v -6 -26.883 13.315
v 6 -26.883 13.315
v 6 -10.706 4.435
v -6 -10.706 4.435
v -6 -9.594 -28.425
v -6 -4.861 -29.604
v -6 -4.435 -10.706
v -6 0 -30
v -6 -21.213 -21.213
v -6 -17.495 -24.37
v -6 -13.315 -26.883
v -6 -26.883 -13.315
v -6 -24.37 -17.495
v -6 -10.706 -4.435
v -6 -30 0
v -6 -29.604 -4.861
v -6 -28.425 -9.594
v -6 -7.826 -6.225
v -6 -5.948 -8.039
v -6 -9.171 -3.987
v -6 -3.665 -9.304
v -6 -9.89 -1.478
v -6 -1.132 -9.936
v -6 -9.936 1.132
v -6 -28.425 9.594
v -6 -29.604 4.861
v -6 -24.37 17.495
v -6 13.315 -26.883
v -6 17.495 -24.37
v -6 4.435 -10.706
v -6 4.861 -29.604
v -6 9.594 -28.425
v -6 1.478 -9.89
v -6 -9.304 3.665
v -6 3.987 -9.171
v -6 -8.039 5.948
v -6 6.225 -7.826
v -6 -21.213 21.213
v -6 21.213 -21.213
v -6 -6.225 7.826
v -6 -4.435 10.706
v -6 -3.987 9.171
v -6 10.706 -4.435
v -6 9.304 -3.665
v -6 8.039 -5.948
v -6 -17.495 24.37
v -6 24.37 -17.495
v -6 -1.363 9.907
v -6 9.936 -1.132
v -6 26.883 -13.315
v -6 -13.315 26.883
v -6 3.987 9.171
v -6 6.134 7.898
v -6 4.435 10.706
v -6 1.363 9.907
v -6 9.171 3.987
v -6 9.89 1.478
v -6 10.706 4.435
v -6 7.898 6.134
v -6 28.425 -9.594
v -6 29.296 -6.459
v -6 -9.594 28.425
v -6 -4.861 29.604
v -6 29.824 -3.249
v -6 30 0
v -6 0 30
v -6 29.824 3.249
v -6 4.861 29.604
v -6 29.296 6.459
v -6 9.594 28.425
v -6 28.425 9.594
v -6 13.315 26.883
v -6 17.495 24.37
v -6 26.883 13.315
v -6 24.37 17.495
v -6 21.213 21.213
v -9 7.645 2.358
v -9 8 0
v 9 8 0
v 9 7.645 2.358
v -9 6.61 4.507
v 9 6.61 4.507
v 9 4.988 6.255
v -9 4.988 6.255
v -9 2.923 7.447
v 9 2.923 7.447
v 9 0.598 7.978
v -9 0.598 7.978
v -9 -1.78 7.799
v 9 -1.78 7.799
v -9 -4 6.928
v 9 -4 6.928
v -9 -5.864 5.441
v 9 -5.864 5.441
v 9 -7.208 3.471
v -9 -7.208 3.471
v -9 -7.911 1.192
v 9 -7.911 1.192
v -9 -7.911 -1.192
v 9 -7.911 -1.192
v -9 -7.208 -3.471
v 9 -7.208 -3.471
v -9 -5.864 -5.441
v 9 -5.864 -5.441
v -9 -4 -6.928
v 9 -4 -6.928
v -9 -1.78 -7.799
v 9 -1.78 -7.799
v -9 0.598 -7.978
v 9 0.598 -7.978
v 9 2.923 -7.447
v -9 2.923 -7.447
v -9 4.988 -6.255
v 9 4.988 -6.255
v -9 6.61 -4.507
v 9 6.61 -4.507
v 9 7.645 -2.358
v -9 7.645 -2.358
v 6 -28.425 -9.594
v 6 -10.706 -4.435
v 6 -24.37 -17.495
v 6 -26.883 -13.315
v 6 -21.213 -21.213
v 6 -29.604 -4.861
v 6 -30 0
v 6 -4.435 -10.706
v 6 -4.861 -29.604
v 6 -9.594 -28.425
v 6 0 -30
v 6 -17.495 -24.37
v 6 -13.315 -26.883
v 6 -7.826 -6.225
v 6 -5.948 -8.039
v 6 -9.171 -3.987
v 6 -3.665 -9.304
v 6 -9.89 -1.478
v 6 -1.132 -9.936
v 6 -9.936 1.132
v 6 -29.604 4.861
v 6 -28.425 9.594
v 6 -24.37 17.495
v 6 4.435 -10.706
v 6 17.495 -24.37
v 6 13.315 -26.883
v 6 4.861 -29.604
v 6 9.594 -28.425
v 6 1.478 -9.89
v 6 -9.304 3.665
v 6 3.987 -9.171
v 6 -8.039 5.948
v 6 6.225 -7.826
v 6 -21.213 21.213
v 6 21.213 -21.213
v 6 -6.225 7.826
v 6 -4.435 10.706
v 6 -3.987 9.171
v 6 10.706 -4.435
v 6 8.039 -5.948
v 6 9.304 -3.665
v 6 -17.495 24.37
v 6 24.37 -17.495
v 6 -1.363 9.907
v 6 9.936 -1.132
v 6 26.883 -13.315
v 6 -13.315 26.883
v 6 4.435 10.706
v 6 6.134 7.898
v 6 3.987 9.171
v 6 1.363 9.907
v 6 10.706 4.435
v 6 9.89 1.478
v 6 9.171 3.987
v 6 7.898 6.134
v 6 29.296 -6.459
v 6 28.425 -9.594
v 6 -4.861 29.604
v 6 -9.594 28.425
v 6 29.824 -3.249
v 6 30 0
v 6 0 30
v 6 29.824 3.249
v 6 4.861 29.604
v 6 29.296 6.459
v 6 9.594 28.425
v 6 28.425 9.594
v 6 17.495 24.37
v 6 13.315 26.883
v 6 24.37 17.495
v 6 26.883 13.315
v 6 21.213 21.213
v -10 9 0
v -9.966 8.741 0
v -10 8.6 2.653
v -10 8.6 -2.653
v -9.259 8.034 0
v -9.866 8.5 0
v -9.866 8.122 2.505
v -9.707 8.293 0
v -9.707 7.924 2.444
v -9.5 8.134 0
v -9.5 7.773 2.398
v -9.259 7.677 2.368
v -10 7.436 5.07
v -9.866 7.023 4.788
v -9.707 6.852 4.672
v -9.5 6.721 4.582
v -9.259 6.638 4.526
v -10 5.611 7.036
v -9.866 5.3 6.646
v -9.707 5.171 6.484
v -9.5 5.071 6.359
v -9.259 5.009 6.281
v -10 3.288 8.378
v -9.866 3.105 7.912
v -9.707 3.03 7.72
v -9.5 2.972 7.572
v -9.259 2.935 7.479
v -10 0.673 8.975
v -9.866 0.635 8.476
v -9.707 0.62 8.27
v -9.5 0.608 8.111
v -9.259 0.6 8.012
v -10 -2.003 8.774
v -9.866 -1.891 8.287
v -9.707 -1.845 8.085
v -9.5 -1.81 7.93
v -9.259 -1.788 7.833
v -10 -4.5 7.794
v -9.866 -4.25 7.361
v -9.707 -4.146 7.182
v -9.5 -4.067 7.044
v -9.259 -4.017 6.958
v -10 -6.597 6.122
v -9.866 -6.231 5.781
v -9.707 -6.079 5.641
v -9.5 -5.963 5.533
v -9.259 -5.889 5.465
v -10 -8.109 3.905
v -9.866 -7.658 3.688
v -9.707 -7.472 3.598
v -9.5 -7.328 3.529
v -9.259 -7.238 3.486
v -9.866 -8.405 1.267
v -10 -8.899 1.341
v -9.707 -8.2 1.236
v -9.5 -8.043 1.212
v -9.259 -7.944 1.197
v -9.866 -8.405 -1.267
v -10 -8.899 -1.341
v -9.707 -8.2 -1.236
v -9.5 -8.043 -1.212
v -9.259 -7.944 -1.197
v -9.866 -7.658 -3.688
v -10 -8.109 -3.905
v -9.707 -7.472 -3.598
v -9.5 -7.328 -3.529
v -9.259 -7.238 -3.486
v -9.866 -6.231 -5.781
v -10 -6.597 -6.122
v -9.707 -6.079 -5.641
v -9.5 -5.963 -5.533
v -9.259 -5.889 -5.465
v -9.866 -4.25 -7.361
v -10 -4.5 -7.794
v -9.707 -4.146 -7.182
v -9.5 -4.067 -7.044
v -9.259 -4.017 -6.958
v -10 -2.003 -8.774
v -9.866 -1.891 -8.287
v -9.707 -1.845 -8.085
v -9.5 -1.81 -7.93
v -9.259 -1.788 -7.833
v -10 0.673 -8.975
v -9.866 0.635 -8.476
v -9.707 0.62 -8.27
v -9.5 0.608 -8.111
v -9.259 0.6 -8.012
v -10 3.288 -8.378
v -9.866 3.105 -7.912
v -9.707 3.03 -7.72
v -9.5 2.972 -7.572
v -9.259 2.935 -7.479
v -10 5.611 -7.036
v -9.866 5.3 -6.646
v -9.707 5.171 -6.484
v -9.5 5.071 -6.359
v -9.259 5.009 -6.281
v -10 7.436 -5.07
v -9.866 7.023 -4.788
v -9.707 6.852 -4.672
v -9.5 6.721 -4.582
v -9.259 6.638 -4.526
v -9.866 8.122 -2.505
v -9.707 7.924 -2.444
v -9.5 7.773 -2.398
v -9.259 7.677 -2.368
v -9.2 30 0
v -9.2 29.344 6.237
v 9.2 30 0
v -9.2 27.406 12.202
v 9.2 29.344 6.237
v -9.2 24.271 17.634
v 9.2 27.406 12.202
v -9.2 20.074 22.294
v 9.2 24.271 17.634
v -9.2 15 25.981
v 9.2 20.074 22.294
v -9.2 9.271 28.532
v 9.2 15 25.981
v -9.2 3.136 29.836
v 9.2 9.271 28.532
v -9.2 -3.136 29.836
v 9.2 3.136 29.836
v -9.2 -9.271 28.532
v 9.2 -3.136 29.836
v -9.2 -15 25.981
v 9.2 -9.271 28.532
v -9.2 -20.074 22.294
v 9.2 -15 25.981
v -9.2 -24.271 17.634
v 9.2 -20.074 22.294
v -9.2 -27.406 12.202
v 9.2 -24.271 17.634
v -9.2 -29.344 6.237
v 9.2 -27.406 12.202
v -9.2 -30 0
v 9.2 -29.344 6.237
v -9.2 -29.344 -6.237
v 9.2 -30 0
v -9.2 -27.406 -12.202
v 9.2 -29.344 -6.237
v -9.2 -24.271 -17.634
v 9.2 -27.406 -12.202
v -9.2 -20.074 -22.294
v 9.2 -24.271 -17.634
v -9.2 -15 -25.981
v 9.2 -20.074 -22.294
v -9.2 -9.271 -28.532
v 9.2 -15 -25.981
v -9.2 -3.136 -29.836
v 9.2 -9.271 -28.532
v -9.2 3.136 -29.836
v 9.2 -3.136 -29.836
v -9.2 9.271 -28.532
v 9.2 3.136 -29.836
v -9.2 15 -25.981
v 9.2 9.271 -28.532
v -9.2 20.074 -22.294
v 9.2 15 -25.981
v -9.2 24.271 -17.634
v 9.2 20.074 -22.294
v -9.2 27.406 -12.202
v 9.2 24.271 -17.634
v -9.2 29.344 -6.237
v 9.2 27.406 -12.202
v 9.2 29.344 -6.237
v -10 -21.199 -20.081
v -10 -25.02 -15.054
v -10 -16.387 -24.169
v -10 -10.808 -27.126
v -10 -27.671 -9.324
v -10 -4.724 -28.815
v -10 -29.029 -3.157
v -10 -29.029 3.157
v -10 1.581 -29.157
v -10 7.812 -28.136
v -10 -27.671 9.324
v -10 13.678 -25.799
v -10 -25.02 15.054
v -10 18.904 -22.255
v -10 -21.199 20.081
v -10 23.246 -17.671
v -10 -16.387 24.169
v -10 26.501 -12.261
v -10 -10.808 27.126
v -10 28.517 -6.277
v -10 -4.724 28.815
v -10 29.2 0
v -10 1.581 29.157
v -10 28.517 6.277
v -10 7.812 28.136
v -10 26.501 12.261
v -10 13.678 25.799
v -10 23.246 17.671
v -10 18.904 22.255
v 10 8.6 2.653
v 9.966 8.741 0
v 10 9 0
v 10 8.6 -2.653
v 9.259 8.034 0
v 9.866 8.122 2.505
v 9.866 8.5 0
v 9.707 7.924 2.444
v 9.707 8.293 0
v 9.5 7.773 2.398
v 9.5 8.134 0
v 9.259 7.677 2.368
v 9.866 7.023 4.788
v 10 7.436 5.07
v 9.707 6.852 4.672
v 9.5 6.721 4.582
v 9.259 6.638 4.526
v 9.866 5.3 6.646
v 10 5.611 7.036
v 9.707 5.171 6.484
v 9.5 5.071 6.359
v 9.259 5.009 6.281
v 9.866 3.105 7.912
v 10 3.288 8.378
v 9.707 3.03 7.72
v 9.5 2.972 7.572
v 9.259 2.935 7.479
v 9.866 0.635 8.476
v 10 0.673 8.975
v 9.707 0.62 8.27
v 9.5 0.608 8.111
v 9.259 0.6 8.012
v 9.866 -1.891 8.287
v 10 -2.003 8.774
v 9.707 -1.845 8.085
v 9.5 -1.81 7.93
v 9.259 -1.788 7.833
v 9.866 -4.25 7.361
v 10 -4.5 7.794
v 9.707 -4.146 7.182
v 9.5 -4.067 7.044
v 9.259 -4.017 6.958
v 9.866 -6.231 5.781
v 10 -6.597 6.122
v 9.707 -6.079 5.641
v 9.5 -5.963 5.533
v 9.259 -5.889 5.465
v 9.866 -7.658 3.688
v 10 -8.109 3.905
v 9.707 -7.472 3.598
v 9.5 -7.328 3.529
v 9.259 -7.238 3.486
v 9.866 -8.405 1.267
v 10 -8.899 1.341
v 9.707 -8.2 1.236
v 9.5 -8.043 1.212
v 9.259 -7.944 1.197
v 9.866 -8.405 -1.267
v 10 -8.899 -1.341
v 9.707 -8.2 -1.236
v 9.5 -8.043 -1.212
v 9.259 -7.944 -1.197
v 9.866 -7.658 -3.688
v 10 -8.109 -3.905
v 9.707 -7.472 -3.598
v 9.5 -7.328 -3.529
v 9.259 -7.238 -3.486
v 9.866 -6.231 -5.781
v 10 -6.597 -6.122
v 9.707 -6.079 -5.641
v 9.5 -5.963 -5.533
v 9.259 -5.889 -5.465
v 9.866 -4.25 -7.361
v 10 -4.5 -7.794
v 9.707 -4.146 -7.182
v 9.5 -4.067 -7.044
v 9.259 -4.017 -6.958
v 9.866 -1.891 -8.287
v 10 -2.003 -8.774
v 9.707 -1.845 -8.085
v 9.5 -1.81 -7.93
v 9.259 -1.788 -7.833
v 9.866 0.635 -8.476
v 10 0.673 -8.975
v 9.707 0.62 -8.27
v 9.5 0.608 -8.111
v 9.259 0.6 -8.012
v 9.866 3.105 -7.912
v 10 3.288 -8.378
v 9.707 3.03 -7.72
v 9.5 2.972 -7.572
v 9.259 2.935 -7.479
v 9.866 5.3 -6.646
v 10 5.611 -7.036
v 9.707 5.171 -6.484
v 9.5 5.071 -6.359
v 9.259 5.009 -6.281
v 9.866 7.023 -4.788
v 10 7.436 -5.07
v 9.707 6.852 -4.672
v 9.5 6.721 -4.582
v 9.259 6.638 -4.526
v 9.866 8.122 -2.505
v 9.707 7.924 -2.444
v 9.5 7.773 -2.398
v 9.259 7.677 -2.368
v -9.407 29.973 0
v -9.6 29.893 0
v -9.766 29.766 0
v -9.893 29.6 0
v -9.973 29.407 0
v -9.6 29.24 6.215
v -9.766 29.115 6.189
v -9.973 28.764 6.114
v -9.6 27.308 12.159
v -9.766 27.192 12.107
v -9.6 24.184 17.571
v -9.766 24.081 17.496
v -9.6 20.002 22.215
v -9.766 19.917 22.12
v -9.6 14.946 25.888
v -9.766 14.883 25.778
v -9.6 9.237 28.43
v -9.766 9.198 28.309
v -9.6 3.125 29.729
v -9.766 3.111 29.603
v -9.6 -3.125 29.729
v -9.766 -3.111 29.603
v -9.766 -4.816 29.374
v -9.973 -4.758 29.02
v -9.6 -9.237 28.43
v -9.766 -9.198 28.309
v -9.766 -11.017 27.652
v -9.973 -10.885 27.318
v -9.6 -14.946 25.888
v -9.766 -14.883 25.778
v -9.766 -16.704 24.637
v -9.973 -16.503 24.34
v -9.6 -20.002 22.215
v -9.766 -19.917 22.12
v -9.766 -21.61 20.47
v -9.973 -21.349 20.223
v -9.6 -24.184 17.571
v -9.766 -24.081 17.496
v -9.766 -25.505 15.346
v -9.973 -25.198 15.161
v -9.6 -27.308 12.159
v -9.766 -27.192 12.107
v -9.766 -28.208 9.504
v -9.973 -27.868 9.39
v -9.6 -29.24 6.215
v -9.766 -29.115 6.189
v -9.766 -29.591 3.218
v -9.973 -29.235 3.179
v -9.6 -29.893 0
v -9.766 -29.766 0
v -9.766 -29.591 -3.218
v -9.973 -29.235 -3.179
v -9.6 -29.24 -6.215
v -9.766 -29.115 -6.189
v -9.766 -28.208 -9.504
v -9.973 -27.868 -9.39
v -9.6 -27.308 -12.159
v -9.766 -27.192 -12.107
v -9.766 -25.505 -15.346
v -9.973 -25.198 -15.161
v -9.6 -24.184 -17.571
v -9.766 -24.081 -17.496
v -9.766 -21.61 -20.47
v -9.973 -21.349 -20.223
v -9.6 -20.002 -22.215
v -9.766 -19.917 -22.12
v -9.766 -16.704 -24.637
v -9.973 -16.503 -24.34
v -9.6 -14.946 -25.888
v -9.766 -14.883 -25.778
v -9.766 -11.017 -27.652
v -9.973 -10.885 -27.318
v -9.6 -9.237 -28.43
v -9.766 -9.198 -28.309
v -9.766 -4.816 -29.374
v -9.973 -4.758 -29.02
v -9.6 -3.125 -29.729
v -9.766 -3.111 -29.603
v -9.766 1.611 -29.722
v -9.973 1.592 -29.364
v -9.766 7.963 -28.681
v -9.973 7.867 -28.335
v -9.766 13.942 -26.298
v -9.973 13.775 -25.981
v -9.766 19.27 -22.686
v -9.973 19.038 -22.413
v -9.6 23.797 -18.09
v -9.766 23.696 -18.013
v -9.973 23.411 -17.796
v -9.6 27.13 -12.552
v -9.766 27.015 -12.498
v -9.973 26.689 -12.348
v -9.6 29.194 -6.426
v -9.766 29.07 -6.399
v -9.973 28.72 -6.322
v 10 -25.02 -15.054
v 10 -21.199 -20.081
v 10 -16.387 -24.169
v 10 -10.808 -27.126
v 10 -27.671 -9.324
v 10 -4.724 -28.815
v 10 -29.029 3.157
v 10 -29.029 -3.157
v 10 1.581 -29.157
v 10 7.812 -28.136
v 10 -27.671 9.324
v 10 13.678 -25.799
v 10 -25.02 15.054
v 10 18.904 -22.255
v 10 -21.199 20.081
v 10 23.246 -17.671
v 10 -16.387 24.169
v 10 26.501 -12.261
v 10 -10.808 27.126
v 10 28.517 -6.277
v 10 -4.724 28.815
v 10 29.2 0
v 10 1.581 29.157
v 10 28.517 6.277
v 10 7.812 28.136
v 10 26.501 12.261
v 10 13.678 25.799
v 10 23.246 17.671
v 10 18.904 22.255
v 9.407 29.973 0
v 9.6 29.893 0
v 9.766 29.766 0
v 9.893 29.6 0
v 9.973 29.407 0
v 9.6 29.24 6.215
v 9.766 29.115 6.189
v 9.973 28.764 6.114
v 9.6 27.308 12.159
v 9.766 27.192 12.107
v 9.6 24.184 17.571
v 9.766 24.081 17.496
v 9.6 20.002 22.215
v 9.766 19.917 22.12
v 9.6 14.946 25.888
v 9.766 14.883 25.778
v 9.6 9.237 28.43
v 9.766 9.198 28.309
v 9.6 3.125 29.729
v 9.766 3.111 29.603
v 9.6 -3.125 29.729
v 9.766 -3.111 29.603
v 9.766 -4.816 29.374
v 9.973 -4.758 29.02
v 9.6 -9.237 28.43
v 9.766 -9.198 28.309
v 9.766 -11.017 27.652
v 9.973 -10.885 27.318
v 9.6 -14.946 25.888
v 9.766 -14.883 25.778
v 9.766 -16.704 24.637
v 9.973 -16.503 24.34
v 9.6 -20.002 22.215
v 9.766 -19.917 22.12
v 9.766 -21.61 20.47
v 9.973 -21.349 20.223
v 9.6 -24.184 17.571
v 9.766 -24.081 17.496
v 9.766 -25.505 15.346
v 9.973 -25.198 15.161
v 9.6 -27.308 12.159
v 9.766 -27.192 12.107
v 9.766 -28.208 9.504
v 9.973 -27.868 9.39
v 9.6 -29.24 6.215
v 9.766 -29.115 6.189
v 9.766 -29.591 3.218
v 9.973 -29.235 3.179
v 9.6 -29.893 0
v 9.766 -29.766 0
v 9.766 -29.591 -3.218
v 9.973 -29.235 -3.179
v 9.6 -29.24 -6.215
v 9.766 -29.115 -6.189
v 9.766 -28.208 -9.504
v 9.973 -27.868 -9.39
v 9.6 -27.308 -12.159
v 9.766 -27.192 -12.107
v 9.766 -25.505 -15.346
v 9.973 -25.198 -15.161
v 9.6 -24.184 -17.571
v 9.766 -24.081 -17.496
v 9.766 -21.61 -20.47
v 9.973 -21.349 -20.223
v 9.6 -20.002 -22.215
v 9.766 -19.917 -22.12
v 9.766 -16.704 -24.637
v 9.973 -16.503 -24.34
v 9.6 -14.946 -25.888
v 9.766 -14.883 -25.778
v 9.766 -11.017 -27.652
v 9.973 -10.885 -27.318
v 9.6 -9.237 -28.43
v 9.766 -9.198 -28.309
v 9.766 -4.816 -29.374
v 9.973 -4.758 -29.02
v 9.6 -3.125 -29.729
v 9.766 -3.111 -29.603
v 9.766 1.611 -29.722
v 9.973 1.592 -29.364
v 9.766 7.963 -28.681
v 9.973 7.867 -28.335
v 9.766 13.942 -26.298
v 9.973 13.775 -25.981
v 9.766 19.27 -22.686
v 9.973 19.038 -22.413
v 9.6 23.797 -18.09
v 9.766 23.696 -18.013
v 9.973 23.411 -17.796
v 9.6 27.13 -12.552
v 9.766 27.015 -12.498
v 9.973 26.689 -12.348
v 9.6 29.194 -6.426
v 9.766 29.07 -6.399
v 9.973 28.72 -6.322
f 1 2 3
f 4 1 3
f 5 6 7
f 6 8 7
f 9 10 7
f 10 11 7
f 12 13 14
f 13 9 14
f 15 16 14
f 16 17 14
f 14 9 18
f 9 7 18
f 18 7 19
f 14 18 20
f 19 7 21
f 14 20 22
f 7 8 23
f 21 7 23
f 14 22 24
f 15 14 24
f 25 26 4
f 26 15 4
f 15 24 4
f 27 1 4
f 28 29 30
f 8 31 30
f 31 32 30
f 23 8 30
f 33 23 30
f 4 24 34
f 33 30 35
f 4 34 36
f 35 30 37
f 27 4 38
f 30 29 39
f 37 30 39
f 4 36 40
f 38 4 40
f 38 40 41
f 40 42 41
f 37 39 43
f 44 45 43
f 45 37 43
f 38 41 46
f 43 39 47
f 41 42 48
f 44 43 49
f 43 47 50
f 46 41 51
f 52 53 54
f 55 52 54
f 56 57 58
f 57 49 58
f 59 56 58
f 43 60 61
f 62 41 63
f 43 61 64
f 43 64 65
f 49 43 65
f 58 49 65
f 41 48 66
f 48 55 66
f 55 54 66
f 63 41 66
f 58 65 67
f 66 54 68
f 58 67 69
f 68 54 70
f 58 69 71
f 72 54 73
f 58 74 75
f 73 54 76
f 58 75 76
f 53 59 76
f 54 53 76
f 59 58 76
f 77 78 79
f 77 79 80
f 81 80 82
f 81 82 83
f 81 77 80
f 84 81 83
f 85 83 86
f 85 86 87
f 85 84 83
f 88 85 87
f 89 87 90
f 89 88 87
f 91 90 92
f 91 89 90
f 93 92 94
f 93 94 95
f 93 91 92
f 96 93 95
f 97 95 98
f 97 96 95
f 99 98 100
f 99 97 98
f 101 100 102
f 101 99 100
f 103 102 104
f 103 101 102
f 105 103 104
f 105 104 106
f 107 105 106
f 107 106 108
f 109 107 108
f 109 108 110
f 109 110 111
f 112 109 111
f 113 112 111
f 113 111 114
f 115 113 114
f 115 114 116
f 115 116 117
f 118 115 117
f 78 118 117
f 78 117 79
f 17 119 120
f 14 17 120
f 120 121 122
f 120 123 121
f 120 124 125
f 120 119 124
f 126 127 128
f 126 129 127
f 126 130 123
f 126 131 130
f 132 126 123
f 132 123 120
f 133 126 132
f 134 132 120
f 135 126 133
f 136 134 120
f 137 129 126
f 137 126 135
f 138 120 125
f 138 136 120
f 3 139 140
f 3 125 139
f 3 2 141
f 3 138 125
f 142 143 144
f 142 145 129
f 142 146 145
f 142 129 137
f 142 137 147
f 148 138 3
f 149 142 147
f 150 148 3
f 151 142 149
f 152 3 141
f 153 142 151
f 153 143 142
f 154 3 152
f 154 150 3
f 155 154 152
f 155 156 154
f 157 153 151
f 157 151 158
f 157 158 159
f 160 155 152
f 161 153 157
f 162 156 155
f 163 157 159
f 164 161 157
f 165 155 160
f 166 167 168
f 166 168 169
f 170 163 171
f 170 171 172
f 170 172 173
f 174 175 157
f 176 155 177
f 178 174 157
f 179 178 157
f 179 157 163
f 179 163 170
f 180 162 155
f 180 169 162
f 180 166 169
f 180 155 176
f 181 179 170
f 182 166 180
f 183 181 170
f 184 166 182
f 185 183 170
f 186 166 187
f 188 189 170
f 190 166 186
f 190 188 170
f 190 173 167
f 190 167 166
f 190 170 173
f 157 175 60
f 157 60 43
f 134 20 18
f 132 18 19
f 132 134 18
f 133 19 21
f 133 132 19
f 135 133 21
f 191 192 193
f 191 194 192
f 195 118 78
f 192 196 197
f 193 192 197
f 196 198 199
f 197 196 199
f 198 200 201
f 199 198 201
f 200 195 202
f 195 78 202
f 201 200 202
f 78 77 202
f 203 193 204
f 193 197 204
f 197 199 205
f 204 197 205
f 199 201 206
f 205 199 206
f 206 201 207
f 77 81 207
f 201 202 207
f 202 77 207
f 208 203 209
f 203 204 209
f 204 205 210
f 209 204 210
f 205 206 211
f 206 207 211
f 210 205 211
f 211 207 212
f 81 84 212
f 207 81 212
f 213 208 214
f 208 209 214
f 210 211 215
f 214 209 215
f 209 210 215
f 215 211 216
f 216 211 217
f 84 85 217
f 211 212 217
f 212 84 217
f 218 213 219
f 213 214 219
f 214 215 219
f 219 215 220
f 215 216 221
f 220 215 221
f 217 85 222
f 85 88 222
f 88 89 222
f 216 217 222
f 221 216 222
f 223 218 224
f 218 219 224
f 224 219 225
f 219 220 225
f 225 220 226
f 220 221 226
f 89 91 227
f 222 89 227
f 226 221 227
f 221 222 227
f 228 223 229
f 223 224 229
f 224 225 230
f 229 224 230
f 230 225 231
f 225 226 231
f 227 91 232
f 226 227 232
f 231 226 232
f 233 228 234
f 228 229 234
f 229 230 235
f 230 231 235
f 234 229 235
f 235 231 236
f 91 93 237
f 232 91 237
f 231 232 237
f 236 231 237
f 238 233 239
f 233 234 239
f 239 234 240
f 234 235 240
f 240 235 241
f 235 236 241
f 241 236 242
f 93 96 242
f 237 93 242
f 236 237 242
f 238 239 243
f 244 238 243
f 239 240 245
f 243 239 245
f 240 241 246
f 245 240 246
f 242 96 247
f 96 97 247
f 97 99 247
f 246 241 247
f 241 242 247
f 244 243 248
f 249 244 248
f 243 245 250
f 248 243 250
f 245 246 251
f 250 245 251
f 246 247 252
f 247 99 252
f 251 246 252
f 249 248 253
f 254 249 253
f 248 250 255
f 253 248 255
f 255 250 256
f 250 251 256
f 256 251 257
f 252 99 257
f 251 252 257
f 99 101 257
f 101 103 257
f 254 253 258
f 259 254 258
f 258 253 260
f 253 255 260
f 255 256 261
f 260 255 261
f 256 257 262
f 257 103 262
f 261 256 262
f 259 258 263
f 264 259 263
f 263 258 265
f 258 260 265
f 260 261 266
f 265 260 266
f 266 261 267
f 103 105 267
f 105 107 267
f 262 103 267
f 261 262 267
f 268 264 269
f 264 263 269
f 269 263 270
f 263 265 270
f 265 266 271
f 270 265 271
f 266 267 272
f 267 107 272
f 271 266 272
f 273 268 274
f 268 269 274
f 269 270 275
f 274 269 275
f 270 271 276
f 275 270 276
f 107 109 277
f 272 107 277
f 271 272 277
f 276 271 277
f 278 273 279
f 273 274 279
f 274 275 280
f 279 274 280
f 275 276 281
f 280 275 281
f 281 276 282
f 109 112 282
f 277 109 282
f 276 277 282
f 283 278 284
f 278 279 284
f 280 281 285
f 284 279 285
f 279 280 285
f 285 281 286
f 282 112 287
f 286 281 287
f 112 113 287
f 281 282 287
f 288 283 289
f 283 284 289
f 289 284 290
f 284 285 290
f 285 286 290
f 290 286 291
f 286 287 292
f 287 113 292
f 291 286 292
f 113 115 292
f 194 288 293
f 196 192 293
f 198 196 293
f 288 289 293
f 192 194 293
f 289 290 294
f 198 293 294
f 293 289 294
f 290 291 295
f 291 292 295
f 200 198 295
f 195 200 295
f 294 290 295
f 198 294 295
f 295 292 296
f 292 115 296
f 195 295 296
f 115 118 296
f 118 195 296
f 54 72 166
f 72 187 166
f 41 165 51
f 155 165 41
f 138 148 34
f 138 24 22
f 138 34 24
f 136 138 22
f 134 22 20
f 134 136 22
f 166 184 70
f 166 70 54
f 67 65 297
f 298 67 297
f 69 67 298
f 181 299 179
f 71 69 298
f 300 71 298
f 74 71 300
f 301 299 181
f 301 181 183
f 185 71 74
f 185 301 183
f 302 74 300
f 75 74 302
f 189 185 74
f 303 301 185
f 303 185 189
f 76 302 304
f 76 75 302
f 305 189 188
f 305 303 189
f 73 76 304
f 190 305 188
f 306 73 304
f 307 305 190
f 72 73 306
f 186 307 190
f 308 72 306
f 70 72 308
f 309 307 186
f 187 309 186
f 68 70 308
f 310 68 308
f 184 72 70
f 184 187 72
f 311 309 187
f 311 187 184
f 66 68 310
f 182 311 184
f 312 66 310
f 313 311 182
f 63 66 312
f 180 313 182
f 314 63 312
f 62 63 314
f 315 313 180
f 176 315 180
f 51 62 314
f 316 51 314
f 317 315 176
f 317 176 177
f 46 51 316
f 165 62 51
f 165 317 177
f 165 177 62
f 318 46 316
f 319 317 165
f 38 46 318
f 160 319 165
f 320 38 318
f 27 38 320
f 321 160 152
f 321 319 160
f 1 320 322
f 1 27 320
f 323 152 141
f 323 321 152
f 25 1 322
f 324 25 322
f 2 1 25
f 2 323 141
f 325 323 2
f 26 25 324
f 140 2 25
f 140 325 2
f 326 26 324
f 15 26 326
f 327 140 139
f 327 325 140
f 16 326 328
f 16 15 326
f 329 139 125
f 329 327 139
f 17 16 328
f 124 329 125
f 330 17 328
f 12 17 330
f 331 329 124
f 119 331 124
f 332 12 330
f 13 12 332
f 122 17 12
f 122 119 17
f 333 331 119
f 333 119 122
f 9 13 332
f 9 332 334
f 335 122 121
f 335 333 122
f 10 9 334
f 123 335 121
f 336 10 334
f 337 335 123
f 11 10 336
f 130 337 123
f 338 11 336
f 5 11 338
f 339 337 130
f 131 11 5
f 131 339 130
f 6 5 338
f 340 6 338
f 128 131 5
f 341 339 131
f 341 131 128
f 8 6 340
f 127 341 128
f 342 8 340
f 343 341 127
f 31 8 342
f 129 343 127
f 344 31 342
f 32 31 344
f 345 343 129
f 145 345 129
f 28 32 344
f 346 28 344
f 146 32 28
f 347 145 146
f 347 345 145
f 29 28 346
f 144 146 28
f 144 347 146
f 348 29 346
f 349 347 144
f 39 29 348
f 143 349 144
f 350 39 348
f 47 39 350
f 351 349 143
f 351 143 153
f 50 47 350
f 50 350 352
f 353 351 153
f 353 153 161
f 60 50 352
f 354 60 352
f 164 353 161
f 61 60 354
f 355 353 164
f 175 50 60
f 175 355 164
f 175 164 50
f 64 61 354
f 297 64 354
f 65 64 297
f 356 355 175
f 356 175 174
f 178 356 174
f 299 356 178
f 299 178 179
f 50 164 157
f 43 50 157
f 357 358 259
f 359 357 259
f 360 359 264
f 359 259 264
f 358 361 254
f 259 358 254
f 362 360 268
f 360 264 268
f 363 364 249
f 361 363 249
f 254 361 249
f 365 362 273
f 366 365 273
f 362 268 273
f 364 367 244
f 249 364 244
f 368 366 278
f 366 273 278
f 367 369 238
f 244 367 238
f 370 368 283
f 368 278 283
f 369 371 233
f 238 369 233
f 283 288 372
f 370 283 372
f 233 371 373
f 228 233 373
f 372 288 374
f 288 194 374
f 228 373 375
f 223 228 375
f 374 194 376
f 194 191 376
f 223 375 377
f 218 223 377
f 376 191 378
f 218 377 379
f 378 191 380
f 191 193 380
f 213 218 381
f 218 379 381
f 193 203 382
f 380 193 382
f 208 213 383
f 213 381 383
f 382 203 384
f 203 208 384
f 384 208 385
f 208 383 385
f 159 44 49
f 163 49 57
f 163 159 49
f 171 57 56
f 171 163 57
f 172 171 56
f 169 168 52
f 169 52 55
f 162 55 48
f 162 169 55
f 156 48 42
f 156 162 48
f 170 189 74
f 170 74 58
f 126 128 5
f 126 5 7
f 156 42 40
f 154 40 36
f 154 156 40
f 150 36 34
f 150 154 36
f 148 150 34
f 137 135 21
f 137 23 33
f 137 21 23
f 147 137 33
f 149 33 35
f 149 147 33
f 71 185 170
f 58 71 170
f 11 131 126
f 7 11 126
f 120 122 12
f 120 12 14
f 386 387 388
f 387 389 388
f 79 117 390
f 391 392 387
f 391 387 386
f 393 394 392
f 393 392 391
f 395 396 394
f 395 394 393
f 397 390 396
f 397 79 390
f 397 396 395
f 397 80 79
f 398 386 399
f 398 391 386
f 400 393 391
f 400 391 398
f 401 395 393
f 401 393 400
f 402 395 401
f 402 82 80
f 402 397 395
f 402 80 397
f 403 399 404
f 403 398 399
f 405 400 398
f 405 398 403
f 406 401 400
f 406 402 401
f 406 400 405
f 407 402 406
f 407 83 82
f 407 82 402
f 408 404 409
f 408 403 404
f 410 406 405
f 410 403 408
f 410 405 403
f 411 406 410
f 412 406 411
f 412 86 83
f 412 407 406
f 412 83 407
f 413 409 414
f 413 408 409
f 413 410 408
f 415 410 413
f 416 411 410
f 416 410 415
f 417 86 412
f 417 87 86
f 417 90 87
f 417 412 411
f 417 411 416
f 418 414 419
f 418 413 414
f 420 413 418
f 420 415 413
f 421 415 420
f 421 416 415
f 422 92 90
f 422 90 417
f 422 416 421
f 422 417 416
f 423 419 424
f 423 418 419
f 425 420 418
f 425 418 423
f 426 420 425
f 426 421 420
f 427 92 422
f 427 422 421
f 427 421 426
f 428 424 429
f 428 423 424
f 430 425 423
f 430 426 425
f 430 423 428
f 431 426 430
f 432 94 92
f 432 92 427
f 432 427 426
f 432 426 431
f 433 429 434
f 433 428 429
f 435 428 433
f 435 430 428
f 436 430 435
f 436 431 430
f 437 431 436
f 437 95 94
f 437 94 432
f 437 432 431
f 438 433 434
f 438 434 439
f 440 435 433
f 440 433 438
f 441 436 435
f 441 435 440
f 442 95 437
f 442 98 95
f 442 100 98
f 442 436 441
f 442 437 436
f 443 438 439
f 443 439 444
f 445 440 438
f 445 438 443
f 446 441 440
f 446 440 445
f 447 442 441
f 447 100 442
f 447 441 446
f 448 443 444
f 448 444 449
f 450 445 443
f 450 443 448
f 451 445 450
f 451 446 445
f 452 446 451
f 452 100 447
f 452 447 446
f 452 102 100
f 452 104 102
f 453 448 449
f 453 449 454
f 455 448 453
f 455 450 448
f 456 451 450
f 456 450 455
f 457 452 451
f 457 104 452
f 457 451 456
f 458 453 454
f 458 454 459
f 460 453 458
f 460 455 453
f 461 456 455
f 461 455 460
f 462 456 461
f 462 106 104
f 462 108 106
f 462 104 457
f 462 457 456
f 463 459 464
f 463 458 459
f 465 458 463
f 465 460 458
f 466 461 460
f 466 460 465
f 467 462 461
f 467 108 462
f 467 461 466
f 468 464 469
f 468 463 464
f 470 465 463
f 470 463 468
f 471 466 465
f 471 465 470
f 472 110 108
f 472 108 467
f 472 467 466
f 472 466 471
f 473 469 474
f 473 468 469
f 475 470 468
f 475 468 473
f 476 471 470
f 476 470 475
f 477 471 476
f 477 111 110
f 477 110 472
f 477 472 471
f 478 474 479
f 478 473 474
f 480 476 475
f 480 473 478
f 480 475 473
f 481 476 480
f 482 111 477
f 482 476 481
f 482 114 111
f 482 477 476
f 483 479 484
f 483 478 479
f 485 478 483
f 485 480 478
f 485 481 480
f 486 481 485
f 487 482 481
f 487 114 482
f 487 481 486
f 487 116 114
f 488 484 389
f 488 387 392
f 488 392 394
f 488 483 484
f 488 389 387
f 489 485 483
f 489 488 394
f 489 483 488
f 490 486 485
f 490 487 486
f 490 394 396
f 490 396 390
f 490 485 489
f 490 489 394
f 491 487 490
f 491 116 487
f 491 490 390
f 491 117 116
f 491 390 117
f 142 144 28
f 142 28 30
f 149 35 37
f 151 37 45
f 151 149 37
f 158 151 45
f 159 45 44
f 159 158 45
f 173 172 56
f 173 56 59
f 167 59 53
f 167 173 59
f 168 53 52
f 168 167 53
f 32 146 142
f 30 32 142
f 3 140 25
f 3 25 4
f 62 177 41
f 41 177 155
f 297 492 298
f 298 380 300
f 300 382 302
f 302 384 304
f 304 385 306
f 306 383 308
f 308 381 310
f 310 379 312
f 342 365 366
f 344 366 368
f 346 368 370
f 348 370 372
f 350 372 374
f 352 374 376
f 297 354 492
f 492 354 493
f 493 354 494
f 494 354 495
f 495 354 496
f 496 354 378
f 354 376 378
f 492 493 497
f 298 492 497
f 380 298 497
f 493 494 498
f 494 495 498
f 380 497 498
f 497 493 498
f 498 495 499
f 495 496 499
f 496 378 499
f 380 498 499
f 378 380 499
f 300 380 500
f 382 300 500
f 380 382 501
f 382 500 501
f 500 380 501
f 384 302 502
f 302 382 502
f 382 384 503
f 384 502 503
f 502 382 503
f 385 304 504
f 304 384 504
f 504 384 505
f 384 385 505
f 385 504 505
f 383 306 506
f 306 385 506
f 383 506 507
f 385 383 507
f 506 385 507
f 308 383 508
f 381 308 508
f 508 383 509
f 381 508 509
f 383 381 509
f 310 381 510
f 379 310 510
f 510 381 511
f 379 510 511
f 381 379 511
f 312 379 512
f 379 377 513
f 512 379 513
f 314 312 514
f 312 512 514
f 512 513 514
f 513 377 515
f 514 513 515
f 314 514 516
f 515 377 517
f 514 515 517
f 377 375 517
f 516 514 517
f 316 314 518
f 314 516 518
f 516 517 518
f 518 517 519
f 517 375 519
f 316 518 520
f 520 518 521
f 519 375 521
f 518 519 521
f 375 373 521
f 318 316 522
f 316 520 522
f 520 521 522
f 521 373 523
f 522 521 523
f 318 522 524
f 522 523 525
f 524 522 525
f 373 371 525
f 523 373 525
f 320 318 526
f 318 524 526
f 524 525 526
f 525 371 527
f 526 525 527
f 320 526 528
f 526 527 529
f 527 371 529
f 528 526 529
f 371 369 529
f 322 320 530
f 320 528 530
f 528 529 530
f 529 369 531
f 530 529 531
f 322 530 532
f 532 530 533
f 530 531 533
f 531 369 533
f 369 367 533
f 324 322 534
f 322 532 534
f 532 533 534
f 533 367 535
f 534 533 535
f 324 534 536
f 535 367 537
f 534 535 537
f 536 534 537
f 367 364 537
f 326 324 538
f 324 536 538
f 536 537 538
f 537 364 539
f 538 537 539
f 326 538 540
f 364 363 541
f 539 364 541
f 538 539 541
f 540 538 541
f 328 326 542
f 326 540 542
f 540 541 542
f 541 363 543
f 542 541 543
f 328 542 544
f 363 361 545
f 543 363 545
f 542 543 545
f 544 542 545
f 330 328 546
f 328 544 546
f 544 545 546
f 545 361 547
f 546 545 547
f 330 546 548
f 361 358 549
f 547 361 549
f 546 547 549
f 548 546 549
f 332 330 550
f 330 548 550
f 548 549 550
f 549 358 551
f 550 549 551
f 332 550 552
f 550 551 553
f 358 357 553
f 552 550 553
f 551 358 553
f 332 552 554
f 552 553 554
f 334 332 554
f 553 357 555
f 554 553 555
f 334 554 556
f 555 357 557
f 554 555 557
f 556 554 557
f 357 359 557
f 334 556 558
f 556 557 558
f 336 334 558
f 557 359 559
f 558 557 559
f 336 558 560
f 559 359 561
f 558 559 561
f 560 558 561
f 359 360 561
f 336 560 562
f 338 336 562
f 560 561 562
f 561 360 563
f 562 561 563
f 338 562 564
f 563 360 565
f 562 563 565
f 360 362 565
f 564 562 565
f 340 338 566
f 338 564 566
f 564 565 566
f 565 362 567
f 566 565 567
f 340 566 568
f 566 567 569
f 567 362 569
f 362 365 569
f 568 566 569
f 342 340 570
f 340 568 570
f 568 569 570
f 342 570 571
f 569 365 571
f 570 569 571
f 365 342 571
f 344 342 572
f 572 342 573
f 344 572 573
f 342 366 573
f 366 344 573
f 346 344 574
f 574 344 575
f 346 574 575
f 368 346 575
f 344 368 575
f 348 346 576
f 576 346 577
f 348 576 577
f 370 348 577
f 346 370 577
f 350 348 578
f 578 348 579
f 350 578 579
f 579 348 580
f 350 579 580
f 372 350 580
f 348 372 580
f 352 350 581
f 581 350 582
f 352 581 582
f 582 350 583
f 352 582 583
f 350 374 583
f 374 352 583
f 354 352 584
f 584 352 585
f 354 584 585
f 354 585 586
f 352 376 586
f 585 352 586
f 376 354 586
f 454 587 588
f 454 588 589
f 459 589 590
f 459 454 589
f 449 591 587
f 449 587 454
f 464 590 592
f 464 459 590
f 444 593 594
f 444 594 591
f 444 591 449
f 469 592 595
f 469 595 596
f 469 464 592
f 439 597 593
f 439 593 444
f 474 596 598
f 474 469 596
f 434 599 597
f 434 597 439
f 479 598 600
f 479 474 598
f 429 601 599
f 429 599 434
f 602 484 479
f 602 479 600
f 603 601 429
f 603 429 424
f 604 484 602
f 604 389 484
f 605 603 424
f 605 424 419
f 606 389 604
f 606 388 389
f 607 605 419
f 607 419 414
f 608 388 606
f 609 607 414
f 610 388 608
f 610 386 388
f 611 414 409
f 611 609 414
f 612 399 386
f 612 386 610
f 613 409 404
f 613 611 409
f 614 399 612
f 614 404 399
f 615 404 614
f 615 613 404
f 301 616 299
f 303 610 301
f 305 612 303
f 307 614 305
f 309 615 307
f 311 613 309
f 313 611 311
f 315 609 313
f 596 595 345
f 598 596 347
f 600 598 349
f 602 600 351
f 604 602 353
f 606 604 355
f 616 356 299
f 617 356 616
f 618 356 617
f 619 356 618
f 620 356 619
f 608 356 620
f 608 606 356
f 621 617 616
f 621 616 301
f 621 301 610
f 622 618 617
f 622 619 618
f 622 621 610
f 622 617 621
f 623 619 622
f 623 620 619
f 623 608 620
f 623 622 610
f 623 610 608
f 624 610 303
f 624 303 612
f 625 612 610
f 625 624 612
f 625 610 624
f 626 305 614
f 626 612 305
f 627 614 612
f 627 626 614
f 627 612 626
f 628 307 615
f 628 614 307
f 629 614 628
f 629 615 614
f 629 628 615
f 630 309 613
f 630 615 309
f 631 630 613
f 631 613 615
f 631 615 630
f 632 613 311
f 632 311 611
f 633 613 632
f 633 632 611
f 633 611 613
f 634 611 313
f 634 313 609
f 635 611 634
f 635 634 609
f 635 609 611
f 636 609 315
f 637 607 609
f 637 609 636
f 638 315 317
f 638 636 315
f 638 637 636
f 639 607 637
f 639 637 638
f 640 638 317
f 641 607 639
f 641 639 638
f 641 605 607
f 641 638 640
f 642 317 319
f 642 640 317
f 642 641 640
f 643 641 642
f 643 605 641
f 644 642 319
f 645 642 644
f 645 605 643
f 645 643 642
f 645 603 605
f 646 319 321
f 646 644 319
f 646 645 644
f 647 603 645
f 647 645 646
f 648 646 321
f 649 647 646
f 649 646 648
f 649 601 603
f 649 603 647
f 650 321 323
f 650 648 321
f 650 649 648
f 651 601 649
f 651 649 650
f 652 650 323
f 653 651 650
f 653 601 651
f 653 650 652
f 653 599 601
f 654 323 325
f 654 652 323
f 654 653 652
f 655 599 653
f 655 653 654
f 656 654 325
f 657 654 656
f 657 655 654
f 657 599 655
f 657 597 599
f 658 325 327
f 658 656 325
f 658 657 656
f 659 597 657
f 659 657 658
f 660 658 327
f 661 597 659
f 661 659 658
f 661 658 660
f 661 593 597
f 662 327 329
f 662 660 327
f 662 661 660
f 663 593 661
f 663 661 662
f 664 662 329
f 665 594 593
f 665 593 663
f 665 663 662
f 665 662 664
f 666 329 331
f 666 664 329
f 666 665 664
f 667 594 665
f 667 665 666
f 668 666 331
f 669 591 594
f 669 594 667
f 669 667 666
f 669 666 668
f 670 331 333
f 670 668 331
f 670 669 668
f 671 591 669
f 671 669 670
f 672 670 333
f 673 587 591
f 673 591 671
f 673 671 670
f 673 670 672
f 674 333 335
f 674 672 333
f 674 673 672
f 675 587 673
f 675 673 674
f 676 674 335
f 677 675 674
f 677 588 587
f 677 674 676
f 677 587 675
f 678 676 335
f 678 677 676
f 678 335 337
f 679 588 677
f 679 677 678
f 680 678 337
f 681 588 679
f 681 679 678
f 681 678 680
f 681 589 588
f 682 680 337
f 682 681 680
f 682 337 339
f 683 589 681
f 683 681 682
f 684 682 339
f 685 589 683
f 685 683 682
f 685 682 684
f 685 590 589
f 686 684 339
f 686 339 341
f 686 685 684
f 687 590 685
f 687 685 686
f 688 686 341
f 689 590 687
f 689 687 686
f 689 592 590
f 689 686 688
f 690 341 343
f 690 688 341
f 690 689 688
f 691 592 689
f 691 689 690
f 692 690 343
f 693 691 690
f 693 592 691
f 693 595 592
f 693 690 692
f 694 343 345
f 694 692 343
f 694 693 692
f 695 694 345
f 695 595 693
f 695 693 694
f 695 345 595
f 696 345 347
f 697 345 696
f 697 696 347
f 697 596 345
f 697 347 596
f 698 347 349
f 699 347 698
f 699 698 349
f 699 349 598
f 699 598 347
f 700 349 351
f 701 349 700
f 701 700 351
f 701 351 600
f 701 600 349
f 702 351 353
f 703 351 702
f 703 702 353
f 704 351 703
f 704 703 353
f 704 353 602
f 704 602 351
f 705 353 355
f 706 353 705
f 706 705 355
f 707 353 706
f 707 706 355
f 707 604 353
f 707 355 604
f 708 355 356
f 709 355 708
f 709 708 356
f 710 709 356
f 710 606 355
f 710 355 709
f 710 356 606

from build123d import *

# Parameters (mm, degrees)
SKETCH_R           = 30
SKETCH_R_2         = 8
PAD_DEPTH          = 10
POCKET_DEPTH       = 6
POLARPATTERN_COUNT = 8
FILLET_R           = 0.8
FILLET001_R        = 1


with BuildPart() as part:
    # Sketch → Pad (new body, symmetric)
    with BuildSketch(Plane.YZ):
        Circle(SKETCH_R)
        Circle(SKETCH_R_2, mode=Mode.SUBTRACT)
    extrude(amount=PAD_DEPTH, both=True)

    # Sketch001 → Pocket (cut, symmetric)
    with BuildSketch(Plane.YZ):
        with BuildLine():
            ThreePointArc((3.987491, 9.170601), (0, 10), (-3.987491, 9.170601))
            Line((-10.153749, 30.346357), (-3.987491, 9.170601))
            ThreePointArc((10.153749, 30.346357), (0, 32), (-10.153749, 30.346357))
            Line((10.153749, 30.346357), (3.987491, 9.170601))
        make_face()
    pocket = extrude(amount=POCKET_DEPTH, both=True, mode=Mode.SUBTRACT)

    # PolarPattern: Pocket ×8 about axis
    polarpattern_axis = Axis((0, 0, 0), (1, 0, 0))
    for i in range(1, POLARPATTERN_COUNT):
        add(pocket.rotate(polarpattern_axis, i * 360 / POLARPATTERN_COUNT), mode=Mode.SUBTRACT)

    # Fillet
    fillet_edges = [part.edges().sort_by_distance(p)[0] for p in [
        (10, -30, 0),
        (-10, -30, 0),
    ]]
    fillet(fillet_edges, radius=FILLET_R)

    # Fillet001
    fillet001_edges = [part.edges().sort_by_distance(p)[0] for p in [
        (-10, -8, 0),
        (10, -8, 0),
    ]]
    fillet(fillet001_edges, radius=FILLET001_R)


solid = part.part
